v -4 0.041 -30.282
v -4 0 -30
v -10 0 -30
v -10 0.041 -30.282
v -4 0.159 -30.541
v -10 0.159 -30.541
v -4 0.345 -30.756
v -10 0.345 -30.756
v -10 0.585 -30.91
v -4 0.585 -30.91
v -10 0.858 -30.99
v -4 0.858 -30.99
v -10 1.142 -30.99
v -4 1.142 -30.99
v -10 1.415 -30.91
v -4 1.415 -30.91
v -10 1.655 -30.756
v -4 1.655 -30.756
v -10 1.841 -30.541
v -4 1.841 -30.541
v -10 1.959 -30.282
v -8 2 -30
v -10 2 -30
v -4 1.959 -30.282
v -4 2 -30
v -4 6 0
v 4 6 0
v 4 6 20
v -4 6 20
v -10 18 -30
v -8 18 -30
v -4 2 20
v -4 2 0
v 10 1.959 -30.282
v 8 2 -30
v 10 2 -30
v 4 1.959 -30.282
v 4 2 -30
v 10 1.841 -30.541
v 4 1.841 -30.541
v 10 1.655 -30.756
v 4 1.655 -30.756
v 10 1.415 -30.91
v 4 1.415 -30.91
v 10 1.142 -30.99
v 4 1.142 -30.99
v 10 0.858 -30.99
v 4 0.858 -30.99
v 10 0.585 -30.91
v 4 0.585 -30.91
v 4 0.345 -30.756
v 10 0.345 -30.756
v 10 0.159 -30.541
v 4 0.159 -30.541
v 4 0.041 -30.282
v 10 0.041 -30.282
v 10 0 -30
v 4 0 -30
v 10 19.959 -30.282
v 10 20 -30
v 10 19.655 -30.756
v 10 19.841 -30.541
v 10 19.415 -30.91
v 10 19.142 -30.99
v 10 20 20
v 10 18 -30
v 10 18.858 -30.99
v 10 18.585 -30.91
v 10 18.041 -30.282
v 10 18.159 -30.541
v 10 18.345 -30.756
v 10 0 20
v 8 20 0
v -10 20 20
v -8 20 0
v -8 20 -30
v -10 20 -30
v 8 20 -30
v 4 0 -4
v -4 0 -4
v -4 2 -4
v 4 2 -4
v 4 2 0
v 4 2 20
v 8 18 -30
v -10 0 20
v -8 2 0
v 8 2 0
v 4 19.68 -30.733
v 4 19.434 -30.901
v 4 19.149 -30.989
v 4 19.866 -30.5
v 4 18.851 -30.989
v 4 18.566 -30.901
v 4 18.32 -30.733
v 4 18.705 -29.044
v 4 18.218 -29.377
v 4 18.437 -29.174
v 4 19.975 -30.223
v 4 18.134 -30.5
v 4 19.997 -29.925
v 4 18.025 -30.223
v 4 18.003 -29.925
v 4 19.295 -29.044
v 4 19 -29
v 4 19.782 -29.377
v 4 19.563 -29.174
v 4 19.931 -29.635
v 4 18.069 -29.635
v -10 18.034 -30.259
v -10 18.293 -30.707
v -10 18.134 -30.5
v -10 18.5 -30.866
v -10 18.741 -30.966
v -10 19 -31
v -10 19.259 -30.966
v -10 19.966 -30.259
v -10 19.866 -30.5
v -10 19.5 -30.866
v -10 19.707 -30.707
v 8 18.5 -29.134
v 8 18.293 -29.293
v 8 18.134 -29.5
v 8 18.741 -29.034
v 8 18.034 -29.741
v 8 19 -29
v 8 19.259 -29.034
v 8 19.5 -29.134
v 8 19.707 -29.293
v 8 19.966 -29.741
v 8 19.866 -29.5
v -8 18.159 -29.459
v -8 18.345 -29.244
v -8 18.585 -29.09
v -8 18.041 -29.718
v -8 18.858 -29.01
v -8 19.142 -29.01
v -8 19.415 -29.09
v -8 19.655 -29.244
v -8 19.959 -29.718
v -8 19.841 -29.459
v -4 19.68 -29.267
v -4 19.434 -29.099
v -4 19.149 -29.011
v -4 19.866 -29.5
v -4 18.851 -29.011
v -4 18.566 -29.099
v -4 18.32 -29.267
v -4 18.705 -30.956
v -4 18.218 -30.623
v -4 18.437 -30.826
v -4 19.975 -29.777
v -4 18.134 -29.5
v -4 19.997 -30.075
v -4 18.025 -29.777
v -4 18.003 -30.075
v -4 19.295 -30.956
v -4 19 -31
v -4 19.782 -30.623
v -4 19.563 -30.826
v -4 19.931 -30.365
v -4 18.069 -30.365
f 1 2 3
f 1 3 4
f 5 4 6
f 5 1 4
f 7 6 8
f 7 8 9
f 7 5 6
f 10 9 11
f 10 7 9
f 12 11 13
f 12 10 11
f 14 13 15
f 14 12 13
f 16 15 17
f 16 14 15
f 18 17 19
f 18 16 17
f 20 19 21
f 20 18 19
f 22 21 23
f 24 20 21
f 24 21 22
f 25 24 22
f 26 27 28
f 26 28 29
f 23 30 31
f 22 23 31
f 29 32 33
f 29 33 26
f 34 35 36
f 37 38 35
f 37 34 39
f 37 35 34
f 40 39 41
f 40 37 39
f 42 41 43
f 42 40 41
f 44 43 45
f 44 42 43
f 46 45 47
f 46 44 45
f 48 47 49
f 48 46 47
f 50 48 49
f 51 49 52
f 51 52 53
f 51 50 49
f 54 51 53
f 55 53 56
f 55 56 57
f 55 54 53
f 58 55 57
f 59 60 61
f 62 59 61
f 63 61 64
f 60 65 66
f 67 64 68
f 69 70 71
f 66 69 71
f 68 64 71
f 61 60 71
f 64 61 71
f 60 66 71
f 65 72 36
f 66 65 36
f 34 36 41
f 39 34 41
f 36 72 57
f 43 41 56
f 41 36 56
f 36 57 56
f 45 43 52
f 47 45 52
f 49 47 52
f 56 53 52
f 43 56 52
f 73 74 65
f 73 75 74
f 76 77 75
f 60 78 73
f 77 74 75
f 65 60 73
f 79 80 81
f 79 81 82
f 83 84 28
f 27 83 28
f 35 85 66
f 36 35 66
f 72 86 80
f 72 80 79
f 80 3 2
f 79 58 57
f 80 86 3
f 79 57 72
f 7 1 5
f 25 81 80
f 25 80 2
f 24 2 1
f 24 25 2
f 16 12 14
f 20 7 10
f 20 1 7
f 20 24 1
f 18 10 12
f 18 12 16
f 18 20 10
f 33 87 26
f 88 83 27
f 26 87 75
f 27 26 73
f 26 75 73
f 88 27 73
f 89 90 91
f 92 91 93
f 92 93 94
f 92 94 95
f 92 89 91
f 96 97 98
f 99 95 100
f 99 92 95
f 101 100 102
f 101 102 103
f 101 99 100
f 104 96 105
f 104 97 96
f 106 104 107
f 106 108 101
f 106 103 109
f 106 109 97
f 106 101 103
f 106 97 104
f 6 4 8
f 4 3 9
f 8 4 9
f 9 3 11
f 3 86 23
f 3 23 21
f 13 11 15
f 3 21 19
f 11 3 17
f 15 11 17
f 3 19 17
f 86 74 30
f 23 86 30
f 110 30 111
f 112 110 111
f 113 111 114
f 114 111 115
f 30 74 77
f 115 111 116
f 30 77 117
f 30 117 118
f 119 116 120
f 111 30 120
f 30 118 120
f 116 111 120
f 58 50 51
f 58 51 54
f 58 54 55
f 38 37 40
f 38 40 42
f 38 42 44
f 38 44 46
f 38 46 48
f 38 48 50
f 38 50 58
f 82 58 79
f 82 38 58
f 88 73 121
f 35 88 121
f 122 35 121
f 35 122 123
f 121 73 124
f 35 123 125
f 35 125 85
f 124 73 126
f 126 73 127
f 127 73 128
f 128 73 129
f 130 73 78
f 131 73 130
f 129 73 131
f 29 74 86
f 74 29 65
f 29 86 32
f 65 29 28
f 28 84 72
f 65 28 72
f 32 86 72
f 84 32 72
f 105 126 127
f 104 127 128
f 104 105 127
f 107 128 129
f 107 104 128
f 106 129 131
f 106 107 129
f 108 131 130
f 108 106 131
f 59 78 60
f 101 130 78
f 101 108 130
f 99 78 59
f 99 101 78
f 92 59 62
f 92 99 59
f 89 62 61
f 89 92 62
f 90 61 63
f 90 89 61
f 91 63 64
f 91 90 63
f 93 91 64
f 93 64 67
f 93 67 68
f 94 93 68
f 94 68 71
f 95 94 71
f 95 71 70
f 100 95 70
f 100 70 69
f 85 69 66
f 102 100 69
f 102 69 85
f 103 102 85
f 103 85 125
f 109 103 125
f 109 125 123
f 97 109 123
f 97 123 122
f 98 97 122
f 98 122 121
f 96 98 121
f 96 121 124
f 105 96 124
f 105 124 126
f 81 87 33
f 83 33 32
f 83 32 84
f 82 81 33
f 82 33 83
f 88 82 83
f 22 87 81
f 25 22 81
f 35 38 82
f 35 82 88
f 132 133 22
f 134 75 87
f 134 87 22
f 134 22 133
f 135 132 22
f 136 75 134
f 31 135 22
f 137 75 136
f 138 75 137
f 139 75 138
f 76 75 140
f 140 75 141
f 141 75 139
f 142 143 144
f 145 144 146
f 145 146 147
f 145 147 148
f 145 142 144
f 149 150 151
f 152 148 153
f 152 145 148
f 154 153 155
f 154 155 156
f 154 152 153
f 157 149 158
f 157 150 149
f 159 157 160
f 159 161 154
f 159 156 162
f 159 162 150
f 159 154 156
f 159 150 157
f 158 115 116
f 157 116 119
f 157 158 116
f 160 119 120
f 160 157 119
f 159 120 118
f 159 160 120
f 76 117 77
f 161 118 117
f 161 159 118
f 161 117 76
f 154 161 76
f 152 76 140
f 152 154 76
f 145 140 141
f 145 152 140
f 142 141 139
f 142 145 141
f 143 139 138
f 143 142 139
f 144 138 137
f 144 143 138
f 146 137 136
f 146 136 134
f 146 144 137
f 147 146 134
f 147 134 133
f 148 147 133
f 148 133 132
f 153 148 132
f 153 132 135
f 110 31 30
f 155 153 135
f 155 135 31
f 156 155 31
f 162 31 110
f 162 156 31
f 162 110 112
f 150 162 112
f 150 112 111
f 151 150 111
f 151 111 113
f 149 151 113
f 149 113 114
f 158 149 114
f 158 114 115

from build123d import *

# Parameters (mm, degrees)
SKETCH_1_W          = 20
SKETCH_1_H          = 50
EXTRUDE_1_DEPTH     = 20
SKETCH_2_W          = 16
SKETCH_2_H          = 30
CUT_EXTRUDE_1_DEPTH = 18
SKETCH_3_W          = 8
SKETCH_3_H          = 38.402735184
CUT_EXTRUDE_2_DEPTH = 18
SKETCH_4_R          = 1
EXTRUDE_2_DEPTH     = 6
SKETCH_5_R          = 1
EXTRUDE_3_DEPTH     = 6
SKETCH_6_W          = 8
SKETCH_6_H          = 4
CUT_EXTRUDE_3_DEPTH = 30


with BuildPart() as part:
    # 草图1 → 凸台-拉伸1 (new body)
    with BuildSketch(Plane(origin=(0, 0, 0), x_dir=(1, 0, 0), z_dir=(0, 1, 0))):
        with Locations((0, 5)):
            Rectangle(SKETCH_1_W, SKETCH_1_H)
    extrude(amount=EXTRUDE_1_DEPTH)

    # 草图2 → 切除-拉伸1 (cut)
    with BuildSketch(Plane(origin=(0, 20, 0), x_dir=(1, 0, 0), z_dir=(0, 1, 0))):
        with Locations((0, 15)):
            Rectangle(SKETCH_2_W, SKETCH_2_H)
    extrude(amount=-CUT_EXTRUDE_1_DEPTH, mode=Mode.SUBTRACT)

    # 草图3 → 切除-拉伸2 (cut)
    with BuildSketch(Plane.XZ):
        with Locations((0, -23.201367592)):
            Rectangle(SKETCH_3_W, SKETCH_3_H)
    extrude(amount=-CUT_EXTRUDE_2_DEPTH, mode=Mode.SUBTRACT)

    # 草图4 → 凸台-拉伸2 (add)
    with BuildSketch(Plane(origin=(-4, 0, 0), x_dir=(0, 0, -1), z_dir=(1, 0, 0))):
        with Locations((30, 1)):
            Circle(SKETCH_4_R)
        with Locations((30, 19)):
            Circle(SKETCH_4_R)
    extrude(amount=-EXTRUDE_2_DEPTH)

    # 草图5 → 凸台-拉伸3 (add)
    with BuildSketch(Plane.ZY.offset(-4)):
        with Locations((-30, 1)):
            Circle(SKETCH_5_R)
        with Locations((-30, 19)):
            Circle(SKETCH_5_R)
    extrude(amount=-EXTRUDE_3_DEPTH)

    # 草图6 → 切除-拉伸3 (cut)
    with BuildSketch(Plane(origin=(0, 0, 0), x_dir=(-1, 0, 0), z_dir=(0, 0, -1))):
        with Locations((0, 4)):
            Rectangle(SKETCH_6_W, SKETCH_6_H)
    extrude(amount=-CUT_EXTRUDE_3_DEPTH, mode=Mode.SUBTRACT)


solid = part.part
